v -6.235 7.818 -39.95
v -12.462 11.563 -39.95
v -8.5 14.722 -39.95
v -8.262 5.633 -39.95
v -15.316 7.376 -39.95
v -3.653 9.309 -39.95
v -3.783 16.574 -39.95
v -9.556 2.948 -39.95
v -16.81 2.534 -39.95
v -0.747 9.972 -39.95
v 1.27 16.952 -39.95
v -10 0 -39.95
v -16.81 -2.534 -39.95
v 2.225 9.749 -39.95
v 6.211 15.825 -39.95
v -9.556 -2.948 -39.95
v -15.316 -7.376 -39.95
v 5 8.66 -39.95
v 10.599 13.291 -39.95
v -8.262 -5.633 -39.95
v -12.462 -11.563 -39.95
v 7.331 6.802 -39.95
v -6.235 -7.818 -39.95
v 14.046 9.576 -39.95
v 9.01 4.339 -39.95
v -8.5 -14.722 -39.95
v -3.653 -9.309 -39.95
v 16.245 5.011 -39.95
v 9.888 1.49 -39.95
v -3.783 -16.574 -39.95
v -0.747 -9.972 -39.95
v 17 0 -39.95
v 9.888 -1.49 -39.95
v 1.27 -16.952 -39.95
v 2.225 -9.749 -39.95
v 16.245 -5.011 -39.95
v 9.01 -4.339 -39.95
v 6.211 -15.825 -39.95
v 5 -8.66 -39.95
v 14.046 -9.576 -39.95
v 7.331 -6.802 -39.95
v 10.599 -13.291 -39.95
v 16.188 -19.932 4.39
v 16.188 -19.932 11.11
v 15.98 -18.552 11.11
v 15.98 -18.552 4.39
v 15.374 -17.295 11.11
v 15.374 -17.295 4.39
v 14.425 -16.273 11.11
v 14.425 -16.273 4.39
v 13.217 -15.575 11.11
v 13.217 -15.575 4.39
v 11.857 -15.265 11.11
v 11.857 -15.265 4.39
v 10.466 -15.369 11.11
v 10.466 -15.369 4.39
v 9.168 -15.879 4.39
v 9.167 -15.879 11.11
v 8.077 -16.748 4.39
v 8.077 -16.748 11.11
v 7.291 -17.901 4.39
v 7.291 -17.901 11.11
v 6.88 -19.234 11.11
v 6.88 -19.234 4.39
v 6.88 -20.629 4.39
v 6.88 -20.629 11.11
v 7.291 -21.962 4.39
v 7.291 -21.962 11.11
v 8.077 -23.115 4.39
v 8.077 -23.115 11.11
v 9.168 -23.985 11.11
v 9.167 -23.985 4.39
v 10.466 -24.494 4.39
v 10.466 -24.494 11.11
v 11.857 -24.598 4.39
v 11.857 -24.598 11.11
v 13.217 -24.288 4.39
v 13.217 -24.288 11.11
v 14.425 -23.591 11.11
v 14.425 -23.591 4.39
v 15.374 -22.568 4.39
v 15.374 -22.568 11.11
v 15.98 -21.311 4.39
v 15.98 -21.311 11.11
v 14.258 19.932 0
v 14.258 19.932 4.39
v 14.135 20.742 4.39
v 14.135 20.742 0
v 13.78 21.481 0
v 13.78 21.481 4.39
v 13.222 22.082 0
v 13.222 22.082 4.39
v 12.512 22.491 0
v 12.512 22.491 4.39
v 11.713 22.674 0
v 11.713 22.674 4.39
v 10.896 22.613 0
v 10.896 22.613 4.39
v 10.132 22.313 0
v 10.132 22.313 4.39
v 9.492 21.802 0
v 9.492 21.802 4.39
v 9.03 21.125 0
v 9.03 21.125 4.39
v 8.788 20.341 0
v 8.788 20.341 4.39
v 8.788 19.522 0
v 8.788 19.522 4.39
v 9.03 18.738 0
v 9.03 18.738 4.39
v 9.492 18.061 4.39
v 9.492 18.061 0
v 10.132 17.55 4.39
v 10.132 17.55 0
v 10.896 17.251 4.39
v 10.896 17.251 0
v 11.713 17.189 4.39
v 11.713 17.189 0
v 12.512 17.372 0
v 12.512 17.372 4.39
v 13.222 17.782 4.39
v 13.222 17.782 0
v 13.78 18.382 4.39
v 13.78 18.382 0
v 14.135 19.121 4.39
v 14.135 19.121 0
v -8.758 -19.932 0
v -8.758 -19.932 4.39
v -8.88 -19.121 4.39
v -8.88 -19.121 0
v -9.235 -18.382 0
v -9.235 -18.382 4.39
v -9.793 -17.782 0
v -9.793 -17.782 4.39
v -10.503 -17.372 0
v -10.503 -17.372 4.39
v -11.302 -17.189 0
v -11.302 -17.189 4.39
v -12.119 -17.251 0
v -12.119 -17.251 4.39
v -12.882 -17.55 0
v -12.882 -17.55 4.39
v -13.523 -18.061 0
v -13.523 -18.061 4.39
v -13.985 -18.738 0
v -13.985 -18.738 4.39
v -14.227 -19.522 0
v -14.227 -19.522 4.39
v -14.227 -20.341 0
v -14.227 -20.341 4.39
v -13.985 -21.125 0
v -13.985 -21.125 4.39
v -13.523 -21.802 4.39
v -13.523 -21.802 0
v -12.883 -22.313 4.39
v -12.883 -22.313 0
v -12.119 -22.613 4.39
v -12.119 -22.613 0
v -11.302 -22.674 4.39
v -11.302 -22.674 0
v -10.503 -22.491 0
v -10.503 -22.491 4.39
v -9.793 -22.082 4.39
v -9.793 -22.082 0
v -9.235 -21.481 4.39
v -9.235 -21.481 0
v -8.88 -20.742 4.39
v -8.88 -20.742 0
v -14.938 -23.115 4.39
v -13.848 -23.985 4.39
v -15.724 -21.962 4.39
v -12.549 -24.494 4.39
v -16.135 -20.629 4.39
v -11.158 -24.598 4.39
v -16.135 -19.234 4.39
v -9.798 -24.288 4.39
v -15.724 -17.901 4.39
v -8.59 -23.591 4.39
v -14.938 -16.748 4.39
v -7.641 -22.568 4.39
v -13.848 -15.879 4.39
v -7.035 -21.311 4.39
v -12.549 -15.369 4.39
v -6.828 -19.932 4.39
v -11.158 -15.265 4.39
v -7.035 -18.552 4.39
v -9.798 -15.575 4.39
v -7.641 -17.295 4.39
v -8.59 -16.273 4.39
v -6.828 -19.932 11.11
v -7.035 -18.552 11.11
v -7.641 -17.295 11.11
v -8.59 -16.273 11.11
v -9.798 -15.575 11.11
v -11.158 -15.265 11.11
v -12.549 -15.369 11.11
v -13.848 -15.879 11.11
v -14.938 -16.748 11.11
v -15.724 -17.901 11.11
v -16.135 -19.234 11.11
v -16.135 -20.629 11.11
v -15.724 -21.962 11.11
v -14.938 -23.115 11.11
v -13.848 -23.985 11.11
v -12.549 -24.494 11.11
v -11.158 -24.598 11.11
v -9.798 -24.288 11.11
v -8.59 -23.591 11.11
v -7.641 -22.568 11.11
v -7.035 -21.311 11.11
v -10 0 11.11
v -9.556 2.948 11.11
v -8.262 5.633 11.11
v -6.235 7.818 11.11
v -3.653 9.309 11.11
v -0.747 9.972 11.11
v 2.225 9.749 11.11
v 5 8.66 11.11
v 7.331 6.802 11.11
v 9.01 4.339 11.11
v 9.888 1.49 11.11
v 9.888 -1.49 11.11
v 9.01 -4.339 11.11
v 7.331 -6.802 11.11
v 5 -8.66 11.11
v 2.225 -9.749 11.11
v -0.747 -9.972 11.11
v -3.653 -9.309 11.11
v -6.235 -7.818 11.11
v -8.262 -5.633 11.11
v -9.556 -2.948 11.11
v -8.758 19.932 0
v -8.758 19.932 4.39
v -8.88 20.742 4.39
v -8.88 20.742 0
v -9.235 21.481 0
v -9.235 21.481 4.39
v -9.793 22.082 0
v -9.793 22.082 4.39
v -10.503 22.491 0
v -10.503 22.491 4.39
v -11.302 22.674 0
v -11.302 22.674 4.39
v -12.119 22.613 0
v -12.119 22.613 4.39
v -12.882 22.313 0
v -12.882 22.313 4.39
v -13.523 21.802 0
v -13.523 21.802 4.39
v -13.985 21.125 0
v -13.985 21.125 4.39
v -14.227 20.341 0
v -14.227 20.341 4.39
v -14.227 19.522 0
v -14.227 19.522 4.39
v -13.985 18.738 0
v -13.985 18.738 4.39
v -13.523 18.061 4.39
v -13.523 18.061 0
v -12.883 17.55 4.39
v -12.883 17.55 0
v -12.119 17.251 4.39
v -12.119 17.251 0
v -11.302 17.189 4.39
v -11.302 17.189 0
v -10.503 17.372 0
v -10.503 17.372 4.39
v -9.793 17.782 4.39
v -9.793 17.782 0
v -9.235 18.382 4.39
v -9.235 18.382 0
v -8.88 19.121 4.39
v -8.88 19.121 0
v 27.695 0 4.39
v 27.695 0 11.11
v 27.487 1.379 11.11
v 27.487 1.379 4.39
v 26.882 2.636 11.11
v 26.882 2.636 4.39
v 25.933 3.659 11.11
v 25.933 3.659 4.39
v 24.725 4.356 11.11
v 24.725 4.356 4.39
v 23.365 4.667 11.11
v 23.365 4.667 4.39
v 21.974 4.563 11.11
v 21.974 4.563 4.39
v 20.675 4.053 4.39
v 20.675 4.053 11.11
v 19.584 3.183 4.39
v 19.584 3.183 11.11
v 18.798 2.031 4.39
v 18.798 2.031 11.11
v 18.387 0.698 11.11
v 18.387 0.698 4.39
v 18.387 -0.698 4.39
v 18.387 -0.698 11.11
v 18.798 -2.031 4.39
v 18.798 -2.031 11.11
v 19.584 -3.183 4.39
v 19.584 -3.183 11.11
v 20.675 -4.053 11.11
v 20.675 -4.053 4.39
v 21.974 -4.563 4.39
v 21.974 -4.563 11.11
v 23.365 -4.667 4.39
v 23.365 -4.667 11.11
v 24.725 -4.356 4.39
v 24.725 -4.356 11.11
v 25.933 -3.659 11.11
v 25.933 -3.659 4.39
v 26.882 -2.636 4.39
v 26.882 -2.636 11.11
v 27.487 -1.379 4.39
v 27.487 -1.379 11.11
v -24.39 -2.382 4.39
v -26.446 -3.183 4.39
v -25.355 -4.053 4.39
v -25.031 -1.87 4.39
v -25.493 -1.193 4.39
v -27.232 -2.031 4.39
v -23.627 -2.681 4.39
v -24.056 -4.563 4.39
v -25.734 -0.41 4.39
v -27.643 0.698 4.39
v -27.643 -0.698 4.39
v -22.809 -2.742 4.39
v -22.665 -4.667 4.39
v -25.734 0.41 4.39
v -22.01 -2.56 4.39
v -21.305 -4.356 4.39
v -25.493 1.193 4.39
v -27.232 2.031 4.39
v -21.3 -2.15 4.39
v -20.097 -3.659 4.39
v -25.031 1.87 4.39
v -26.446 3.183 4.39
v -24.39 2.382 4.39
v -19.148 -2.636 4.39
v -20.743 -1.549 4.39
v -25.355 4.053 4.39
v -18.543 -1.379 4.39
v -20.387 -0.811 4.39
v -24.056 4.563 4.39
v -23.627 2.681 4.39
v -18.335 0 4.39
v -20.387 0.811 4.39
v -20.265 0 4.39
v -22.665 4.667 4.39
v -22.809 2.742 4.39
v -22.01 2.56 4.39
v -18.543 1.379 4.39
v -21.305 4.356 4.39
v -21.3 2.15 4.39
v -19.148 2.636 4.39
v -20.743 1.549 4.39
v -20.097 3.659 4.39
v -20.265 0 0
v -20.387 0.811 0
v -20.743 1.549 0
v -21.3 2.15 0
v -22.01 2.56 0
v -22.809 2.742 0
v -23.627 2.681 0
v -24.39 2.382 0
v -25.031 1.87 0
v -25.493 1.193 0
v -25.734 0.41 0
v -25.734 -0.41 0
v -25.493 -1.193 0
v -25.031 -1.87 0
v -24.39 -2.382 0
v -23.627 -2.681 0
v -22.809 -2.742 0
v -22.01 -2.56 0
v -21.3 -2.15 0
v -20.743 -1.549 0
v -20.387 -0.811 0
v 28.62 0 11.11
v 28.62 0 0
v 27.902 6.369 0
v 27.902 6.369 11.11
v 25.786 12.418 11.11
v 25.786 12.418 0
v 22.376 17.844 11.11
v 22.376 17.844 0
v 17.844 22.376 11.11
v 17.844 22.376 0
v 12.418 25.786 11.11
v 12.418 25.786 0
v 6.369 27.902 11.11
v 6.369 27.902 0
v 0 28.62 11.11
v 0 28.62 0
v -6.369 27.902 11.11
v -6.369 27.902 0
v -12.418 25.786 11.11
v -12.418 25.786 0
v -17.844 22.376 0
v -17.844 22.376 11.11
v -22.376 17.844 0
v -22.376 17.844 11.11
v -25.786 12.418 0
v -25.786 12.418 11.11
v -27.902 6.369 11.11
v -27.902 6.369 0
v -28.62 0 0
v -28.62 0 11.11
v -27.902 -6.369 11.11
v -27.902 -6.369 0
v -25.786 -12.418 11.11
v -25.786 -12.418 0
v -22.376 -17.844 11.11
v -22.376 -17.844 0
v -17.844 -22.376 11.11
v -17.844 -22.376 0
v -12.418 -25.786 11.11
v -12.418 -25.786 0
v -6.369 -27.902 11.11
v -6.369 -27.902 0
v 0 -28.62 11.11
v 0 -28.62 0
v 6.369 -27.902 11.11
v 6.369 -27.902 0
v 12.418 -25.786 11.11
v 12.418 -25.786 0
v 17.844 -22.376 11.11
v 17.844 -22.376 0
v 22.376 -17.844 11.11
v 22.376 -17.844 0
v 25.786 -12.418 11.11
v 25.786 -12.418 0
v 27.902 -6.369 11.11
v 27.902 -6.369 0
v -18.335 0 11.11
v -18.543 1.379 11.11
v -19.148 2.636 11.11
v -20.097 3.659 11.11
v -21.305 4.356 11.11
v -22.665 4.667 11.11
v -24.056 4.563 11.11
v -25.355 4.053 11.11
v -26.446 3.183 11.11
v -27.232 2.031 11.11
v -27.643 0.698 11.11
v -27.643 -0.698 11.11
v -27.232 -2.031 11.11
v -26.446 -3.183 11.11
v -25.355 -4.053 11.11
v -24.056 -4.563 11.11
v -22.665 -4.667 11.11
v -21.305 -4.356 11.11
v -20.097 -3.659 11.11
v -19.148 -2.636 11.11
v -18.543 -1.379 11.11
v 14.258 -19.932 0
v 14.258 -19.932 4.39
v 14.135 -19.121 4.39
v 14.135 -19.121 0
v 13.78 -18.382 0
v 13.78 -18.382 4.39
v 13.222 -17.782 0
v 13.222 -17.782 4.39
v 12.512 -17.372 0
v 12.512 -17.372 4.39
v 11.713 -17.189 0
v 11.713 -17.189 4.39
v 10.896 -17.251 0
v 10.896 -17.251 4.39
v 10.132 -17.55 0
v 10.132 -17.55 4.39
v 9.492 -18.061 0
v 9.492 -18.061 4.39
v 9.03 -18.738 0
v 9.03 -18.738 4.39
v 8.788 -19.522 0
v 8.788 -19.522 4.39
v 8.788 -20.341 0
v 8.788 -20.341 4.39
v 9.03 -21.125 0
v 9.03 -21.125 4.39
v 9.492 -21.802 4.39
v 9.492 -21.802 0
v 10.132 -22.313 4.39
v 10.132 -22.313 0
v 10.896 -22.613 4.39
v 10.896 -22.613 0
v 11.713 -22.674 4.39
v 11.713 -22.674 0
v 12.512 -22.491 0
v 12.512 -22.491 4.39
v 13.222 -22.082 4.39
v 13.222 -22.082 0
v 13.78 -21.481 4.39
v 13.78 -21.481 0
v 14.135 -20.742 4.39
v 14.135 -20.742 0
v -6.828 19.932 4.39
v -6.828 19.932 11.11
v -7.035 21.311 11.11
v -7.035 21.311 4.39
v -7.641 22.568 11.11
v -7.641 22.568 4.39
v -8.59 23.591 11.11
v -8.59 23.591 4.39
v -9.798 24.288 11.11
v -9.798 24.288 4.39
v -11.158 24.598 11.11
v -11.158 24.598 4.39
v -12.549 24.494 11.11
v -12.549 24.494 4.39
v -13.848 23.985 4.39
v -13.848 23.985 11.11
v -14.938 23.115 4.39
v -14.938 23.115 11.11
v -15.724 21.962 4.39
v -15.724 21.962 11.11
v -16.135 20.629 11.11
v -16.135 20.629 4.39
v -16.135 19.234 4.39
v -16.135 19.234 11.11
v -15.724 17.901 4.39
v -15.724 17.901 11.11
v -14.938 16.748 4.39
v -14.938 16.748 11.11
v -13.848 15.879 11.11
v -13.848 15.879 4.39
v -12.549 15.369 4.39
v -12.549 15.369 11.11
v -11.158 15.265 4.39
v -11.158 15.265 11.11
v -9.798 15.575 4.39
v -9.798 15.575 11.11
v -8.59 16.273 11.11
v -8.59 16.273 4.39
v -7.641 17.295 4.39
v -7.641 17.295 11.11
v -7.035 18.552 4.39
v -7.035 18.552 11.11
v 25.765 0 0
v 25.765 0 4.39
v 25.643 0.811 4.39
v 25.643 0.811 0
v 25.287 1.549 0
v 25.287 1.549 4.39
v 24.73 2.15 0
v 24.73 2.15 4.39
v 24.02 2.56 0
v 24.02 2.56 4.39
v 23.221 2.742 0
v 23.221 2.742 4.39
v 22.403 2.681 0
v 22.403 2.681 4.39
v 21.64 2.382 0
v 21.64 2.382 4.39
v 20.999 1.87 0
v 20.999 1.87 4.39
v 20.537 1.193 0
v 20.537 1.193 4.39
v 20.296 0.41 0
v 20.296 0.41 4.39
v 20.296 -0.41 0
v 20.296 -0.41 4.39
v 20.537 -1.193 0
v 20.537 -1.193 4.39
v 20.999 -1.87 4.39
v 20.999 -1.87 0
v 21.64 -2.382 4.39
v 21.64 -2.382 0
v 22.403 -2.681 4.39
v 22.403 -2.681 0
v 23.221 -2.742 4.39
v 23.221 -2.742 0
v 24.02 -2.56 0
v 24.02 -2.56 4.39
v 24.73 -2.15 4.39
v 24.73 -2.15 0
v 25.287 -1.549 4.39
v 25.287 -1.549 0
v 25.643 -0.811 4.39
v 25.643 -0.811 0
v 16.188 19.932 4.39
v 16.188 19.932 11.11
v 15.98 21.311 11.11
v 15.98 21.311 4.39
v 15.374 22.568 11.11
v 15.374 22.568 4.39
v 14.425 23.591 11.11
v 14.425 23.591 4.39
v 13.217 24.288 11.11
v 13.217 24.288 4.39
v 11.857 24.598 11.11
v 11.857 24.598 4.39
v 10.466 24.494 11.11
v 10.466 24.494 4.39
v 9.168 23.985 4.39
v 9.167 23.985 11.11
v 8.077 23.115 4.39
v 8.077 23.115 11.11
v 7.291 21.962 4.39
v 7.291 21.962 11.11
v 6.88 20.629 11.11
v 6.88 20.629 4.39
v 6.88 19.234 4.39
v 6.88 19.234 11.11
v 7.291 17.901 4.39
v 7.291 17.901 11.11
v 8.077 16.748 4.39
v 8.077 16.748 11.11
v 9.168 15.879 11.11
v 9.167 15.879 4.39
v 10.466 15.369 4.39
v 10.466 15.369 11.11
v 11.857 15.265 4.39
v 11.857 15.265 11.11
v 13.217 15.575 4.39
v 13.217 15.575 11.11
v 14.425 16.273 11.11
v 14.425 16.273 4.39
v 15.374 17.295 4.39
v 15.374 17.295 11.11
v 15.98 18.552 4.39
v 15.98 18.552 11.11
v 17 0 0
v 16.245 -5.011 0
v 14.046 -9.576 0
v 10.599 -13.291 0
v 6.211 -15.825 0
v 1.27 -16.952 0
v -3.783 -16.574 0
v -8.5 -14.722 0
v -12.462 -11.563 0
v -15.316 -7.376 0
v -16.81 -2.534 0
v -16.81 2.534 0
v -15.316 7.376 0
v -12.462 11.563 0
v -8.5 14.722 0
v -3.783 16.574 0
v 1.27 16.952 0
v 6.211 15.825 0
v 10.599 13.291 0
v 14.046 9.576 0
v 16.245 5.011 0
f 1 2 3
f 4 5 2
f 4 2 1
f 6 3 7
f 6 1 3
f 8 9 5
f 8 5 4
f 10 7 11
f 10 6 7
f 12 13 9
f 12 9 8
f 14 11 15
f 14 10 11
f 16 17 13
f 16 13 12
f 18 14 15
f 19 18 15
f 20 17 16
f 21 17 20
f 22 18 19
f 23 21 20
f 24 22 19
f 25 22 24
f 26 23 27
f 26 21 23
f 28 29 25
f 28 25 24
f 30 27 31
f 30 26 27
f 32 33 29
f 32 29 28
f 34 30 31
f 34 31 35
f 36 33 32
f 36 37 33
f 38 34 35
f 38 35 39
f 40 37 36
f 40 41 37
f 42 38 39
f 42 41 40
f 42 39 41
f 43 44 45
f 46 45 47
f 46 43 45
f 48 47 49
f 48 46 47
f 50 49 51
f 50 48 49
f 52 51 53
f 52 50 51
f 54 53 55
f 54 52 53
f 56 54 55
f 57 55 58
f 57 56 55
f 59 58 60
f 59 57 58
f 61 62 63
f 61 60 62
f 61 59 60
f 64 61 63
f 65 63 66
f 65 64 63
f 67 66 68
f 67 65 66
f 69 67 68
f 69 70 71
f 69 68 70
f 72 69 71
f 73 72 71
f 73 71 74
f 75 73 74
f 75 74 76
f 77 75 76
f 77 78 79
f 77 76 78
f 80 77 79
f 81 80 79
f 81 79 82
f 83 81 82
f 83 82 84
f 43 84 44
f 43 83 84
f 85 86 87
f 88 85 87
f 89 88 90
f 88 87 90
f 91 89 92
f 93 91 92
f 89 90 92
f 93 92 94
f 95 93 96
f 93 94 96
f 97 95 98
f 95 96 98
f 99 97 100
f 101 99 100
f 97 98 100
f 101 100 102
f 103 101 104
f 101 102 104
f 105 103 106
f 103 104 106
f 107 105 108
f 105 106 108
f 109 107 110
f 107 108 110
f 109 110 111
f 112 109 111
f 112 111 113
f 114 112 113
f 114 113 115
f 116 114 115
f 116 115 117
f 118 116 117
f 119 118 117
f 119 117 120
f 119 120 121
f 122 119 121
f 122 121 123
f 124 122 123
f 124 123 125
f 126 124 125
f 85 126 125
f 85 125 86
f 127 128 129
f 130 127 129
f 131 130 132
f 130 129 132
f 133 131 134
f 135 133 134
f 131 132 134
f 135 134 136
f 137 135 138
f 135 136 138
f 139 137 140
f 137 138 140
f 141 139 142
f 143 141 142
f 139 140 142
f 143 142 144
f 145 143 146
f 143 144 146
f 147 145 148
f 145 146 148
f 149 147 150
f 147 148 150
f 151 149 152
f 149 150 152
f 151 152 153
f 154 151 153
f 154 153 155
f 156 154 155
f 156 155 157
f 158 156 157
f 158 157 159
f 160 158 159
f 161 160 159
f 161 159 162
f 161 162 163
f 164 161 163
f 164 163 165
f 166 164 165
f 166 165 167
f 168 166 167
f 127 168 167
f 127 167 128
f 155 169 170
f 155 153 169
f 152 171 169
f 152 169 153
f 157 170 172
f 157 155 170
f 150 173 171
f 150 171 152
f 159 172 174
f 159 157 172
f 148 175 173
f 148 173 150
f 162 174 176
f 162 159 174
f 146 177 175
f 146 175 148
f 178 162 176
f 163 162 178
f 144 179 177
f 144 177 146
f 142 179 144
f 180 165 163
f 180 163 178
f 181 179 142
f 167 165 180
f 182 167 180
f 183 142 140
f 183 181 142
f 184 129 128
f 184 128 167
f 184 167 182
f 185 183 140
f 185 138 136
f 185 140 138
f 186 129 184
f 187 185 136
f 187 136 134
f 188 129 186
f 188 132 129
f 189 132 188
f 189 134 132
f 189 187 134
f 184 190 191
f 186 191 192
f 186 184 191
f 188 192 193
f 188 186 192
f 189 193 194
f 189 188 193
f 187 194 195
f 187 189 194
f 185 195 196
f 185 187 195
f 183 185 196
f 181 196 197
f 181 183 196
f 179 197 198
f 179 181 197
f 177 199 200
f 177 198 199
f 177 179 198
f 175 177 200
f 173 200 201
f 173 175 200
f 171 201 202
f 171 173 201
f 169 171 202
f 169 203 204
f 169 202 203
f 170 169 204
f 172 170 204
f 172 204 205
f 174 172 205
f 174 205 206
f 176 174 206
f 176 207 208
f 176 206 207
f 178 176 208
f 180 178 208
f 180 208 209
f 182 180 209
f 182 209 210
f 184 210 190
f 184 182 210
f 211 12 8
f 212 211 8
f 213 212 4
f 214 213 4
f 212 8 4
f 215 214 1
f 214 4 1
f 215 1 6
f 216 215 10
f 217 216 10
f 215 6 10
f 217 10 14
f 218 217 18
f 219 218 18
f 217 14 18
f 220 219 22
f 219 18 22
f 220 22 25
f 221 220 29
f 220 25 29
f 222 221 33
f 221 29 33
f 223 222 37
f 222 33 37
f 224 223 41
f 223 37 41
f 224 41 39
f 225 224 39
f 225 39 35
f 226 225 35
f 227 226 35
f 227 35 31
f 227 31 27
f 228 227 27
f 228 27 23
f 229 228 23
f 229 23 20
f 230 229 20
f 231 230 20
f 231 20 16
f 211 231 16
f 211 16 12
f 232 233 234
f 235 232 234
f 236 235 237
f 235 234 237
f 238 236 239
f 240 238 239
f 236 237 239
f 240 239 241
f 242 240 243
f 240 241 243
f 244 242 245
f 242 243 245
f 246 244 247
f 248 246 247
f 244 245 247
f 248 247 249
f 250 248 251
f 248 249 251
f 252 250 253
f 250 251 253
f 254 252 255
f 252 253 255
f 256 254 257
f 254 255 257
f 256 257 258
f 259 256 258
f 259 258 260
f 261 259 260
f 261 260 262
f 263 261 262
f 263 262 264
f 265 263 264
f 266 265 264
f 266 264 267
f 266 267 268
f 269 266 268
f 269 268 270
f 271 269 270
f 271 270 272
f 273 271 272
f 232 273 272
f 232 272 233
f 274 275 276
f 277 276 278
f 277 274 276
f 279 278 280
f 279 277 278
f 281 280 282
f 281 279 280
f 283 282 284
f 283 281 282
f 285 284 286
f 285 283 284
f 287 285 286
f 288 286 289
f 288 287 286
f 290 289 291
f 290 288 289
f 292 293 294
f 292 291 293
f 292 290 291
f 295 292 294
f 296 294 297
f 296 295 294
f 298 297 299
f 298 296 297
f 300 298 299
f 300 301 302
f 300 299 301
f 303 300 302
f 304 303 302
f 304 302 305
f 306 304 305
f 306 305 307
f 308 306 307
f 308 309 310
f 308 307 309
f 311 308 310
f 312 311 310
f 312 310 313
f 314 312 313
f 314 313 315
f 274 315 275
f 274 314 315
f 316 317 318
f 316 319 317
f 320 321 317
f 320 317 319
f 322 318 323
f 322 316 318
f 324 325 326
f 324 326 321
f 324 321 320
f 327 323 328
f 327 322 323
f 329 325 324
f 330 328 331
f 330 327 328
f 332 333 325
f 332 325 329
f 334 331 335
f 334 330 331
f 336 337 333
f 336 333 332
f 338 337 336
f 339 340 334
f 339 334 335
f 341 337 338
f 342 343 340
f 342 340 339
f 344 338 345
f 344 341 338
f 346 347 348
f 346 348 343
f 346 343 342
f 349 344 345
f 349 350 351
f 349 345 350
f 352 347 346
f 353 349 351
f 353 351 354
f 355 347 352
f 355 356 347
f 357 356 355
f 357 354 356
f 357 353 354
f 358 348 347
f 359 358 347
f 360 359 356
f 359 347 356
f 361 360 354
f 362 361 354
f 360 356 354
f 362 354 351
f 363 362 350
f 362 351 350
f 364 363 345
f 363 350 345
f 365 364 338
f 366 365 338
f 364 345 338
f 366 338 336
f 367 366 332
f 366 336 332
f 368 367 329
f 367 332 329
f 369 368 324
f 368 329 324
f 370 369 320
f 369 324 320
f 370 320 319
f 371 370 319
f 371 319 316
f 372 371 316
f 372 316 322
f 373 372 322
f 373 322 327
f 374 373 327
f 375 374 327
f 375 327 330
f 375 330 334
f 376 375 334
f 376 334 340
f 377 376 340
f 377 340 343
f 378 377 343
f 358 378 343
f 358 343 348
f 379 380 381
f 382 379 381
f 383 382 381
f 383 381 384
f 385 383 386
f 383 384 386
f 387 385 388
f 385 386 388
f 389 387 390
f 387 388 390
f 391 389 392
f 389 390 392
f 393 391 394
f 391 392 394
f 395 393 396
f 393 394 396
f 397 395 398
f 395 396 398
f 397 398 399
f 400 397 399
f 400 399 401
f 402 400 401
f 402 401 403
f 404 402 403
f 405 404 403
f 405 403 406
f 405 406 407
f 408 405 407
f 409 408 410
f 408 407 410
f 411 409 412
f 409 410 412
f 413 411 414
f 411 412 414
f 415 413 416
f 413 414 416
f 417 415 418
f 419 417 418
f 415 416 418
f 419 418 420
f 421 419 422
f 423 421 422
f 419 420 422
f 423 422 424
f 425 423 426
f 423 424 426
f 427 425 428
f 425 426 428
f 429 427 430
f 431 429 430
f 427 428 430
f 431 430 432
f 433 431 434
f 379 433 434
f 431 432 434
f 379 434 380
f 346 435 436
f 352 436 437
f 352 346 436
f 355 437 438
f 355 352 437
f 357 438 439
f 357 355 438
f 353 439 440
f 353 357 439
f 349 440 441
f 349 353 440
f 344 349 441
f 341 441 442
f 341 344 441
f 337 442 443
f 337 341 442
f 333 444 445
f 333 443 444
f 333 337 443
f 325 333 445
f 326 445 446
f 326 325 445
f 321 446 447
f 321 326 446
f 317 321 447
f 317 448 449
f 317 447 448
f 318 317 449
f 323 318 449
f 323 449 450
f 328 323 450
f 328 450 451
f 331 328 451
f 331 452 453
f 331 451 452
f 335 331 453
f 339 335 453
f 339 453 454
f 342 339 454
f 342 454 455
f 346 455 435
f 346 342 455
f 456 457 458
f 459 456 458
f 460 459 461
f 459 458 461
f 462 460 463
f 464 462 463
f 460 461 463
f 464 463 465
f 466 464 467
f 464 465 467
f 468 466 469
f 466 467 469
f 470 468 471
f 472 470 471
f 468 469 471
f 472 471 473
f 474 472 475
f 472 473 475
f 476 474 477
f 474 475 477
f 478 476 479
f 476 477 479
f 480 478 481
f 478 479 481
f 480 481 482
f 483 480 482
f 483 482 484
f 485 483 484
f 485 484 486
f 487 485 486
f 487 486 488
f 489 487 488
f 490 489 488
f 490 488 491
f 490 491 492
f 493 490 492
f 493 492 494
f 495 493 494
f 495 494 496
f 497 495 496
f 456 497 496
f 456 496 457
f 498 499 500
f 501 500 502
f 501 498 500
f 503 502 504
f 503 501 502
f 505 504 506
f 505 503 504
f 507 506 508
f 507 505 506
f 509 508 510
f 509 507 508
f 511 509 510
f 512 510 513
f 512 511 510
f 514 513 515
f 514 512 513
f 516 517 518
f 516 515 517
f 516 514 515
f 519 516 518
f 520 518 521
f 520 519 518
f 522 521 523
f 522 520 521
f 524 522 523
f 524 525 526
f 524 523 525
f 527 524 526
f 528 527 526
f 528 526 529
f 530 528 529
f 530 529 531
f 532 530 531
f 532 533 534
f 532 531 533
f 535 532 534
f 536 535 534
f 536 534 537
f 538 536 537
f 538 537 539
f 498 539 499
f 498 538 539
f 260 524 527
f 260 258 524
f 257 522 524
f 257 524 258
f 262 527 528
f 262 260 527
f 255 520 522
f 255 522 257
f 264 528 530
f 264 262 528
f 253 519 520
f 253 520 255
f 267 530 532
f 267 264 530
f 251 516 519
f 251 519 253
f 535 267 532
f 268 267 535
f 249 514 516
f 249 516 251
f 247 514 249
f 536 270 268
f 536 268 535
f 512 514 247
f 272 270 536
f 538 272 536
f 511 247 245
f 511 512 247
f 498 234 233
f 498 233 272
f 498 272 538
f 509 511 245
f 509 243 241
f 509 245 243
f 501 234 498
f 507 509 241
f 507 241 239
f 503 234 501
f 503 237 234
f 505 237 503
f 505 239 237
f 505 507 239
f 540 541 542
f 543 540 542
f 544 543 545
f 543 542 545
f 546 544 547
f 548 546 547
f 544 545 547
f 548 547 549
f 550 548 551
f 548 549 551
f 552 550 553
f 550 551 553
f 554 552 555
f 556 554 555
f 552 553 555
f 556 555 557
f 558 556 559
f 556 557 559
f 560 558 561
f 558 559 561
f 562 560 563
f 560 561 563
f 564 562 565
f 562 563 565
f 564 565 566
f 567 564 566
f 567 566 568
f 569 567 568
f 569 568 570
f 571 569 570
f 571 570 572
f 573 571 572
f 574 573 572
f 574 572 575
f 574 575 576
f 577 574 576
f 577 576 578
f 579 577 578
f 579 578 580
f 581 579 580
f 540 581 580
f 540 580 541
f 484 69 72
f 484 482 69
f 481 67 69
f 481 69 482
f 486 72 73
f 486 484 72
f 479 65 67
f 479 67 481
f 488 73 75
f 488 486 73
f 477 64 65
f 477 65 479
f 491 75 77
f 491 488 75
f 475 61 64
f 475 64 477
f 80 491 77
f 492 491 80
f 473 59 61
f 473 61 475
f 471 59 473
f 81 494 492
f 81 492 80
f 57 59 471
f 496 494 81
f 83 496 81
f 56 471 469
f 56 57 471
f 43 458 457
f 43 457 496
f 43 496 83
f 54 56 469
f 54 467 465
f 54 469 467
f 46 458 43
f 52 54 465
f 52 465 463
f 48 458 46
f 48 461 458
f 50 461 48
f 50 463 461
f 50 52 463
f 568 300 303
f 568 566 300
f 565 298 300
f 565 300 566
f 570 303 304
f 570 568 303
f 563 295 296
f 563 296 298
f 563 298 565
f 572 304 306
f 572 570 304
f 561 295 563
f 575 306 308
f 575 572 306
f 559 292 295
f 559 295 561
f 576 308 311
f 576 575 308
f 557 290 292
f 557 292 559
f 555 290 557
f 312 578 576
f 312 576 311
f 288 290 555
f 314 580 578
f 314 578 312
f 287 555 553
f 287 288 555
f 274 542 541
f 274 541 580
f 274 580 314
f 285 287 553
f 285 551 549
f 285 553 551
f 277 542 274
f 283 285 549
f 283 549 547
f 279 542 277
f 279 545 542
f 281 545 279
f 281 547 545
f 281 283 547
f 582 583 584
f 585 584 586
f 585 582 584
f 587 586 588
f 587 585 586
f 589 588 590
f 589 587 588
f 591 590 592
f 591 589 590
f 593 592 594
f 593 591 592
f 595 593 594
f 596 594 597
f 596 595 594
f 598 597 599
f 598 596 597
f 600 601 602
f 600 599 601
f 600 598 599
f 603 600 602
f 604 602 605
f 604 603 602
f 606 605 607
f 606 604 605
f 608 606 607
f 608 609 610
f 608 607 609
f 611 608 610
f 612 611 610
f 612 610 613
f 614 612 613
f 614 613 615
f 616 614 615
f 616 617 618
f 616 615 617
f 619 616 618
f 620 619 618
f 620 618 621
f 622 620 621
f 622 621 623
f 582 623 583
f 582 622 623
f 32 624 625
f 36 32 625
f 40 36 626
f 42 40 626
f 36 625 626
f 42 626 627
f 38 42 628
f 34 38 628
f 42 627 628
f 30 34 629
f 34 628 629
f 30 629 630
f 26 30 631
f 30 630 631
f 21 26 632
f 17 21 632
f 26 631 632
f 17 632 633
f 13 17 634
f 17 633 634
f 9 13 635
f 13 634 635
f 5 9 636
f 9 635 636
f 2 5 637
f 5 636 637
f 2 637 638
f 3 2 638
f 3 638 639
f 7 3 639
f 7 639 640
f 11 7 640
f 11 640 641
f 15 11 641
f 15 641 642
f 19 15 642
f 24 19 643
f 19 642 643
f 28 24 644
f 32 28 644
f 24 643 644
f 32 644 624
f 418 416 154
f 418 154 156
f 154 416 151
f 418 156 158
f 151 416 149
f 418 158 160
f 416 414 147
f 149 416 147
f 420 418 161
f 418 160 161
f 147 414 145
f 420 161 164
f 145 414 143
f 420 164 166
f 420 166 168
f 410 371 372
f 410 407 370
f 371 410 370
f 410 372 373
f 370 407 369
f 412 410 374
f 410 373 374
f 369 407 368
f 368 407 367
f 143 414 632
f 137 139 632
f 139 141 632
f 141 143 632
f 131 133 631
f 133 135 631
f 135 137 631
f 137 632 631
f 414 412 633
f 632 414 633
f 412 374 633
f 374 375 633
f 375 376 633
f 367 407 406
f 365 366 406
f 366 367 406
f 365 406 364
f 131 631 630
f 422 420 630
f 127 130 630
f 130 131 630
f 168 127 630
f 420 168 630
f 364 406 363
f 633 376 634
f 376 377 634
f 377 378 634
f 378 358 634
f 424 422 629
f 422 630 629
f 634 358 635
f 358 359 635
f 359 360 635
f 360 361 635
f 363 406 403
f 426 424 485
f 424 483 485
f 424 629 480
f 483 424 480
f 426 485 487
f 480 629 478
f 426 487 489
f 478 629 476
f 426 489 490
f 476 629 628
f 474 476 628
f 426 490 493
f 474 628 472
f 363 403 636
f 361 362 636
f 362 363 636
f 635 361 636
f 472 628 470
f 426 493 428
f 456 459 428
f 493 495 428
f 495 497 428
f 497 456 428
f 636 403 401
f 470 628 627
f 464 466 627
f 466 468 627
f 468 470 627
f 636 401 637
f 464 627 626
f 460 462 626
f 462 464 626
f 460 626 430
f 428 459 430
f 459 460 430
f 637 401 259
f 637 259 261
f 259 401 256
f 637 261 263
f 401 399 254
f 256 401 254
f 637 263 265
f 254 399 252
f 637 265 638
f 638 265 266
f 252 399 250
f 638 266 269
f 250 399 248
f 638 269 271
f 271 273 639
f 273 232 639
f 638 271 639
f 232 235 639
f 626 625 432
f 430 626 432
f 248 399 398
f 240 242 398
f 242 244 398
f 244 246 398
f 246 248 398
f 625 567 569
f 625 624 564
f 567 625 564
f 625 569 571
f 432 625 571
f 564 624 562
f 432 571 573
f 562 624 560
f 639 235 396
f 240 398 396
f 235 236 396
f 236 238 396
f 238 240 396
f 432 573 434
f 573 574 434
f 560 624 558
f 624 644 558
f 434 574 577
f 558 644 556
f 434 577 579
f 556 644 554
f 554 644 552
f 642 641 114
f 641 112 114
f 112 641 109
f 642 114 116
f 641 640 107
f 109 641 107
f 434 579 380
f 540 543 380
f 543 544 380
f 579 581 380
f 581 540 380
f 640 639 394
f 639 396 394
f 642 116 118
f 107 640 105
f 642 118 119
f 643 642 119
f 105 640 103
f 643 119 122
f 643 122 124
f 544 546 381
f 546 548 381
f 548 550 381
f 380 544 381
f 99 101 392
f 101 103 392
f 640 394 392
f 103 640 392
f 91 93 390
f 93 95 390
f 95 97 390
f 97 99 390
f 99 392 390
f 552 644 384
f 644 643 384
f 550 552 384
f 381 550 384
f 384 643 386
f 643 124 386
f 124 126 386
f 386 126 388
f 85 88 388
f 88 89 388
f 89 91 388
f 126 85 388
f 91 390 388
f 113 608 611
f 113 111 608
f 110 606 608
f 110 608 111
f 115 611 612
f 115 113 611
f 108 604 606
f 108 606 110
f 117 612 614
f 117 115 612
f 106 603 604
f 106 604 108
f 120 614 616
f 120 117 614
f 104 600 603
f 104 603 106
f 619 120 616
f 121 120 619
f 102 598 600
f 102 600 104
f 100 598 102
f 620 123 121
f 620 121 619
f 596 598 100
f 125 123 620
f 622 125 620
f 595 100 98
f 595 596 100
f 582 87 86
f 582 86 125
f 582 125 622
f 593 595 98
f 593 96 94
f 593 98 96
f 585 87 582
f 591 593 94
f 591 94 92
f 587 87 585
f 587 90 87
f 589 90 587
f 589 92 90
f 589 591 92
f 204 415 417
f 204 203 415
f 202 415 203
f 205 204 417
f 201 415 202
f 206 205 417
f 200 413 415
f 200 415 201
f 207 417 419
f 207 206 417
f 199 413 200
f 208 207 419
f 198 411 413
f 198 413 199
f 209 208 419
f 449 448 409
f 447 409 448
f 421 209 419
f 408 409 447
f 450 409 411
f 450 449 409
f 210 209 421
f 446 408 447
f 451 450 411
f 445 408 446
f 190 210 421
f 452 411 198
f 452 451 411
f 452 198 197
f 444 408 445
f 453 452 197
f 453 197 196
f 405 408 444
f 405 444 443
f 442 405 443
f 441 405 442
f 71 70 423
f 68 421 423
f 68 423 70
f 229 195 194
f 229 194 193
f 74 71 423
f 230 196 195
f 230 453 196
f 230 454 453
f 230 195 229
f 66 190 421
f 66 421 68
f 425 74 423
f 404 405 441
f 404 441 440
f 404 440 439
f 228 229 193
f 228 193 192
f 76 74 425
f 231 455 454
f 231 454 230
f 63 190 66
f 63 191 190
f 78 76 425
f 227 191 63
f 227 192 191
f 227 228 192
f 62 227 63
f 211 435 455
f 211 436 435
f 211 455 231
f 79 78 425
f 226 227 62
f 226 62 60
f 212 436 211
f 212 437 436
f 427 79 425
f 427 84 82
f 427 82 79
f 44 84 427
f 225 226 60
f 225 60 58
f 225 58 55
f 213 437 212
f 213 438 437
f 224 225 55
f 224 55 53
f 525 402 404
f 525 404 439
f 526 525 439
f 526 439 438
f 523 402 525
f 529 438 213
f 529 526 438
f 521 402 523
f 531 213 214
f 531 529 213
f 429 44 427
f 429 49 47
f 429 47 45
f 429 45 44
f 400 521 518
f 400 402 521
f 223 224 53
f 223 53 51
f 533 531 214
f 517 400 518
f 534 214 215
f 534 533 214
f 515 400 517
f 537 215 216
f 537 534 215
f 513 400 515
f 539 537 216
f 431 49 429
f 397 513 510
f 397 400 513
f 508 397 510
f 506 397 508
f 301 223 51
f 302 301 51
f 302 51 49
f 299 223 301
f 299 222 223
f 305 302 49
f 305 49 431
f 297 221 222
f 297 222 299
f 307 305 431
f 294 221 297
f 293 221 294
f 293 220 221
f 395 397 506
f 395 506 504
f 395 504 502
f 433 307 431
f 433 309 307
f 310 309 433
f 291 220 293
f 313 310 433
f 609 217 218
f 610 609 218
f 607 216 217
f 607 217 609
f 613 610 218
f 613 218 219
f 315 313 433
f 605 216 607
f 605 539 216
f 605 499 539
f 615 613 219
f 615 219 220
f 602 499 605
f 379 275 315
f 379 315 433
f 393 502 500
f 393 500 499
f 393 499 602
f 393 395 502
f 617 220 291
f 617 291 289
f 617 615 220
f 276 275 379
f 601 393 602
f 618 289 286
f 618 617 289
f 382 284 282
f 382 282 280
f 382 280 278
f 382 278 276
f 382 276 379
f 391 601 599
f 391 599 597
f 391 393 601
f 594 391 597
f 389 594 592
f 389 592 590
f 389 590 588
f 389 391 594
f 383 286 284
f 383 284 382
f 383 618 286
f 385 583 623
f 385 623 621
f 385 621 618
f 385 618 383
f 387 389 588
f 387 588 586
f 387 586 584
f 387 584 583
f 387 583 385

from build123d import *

# Parameters (mm, degrees)
ESBO_O1_R                = 28.62
RESSALTO_EXTRUS_O1_DEPTH = 11.11
ESBO_O2_R                = 17
RESSALTO_EXTRUS_O2_DEPTH = 39.95
ESBO_O3_R                = 10
CORTE_EXTRUS_O1_DEPTH    = 66.15621536
ESBO_O6_R                = 2.75
CORTE_EXTRUS_O3_DEPTH    = 11.11
CORTE_EXTRUS_O2_START    = 4.39
ESBO_O4_R                = 4.68
CORTE_EXTRUS_O2_DEPTH    = 53.480126604


with BuildPart() as part:
    # Esboço1 → Ressalto-extrusão1 (new body)
    with BuildSketch(Plane.XY):
        Circle(ESBO_O1_R)
    extrude(amount=RESSALTO_EXTRUS_O1_DEPTH)

    # Esboço2 → Ressalto-extrusão2 (add)
    with BuildSketch(Plane(origin=(0, 0, 0), x_dir=(-1, 0, 0), z_dir=(0, 0, -1))):
        with Locations(Location((0, 0, 0), (0, 0, 180))):
            Circle(ESBO_O2_R)
    extrude(amount=RESSALTO_EXTRUS_O2_DEPTH)

    # Esboço3 → Corte-extrusão1 (cut, through all)
    with BuildSketch(Plane(origin=(0, 0, -39.95), x_dir=(-1, 0, 0), z_dir=(0, 0, -1))):
        Circle(ESBO_O3_R)
    extrude(amount=-CORTE_EXTRUS_O1_DEPTH, mode=Mode.SUBTRACT)

    # Esboço6 → Corte-extrusão3 (cut)
    with BuildSketch(Plane.XY.offset(11.11)):
        with Locations((23.015, 0)):
            Circle(ESBO_O6_R)
        with Locations((11.5075, -19.931574668)):
            Circle(ESBO_O6_R)
        with Locations((-11.5075, -19.931574668)):
            Circle(ESBO_O6_R)
        with Locations((-23.015, 0)):
            Circle(ESBO_O6_R)
        with Locations((-11.5075, 19.931574668)):
            Circle(ESBO_O6_R)
        with Locations((11.5075, 19.931574668)):
            Circle(ESBO_O6_R)
    extrude(amount=-CORTE_EXTRUS_O3_DEPTH, mode=Mode.SUBTRACT)

    # Esboço4 → Corte-extrusão2 (cut, through all)
    with BuildSketch(Plane.XY.offset(CORTE_EXTRUS_O2_START)):
        with Locations((23.015, 0)):
            Circle(ESBO_O4_R)
        with Locations((11.5075, -19.931574668)):
            Circle(ESBO_O4_R)
        with Locations((-11.5075, -19.931574668)):
            Circle(ESBO_O4_R)
        with Locations((-23.015, 0)):
            Circle(ESBO_O4_R)
        with Locations((-11.5075, 19.931574668)):
            Circle(ESBO_O4_R)
        with Locations((11.5075, 19.931574668)):
            Circle(ESBO_O4_R)
    extrude(amount=CORTE_EXTRUS_O2_DEPTH, mode=Mode.SUBTRACT)


solid = part.part
